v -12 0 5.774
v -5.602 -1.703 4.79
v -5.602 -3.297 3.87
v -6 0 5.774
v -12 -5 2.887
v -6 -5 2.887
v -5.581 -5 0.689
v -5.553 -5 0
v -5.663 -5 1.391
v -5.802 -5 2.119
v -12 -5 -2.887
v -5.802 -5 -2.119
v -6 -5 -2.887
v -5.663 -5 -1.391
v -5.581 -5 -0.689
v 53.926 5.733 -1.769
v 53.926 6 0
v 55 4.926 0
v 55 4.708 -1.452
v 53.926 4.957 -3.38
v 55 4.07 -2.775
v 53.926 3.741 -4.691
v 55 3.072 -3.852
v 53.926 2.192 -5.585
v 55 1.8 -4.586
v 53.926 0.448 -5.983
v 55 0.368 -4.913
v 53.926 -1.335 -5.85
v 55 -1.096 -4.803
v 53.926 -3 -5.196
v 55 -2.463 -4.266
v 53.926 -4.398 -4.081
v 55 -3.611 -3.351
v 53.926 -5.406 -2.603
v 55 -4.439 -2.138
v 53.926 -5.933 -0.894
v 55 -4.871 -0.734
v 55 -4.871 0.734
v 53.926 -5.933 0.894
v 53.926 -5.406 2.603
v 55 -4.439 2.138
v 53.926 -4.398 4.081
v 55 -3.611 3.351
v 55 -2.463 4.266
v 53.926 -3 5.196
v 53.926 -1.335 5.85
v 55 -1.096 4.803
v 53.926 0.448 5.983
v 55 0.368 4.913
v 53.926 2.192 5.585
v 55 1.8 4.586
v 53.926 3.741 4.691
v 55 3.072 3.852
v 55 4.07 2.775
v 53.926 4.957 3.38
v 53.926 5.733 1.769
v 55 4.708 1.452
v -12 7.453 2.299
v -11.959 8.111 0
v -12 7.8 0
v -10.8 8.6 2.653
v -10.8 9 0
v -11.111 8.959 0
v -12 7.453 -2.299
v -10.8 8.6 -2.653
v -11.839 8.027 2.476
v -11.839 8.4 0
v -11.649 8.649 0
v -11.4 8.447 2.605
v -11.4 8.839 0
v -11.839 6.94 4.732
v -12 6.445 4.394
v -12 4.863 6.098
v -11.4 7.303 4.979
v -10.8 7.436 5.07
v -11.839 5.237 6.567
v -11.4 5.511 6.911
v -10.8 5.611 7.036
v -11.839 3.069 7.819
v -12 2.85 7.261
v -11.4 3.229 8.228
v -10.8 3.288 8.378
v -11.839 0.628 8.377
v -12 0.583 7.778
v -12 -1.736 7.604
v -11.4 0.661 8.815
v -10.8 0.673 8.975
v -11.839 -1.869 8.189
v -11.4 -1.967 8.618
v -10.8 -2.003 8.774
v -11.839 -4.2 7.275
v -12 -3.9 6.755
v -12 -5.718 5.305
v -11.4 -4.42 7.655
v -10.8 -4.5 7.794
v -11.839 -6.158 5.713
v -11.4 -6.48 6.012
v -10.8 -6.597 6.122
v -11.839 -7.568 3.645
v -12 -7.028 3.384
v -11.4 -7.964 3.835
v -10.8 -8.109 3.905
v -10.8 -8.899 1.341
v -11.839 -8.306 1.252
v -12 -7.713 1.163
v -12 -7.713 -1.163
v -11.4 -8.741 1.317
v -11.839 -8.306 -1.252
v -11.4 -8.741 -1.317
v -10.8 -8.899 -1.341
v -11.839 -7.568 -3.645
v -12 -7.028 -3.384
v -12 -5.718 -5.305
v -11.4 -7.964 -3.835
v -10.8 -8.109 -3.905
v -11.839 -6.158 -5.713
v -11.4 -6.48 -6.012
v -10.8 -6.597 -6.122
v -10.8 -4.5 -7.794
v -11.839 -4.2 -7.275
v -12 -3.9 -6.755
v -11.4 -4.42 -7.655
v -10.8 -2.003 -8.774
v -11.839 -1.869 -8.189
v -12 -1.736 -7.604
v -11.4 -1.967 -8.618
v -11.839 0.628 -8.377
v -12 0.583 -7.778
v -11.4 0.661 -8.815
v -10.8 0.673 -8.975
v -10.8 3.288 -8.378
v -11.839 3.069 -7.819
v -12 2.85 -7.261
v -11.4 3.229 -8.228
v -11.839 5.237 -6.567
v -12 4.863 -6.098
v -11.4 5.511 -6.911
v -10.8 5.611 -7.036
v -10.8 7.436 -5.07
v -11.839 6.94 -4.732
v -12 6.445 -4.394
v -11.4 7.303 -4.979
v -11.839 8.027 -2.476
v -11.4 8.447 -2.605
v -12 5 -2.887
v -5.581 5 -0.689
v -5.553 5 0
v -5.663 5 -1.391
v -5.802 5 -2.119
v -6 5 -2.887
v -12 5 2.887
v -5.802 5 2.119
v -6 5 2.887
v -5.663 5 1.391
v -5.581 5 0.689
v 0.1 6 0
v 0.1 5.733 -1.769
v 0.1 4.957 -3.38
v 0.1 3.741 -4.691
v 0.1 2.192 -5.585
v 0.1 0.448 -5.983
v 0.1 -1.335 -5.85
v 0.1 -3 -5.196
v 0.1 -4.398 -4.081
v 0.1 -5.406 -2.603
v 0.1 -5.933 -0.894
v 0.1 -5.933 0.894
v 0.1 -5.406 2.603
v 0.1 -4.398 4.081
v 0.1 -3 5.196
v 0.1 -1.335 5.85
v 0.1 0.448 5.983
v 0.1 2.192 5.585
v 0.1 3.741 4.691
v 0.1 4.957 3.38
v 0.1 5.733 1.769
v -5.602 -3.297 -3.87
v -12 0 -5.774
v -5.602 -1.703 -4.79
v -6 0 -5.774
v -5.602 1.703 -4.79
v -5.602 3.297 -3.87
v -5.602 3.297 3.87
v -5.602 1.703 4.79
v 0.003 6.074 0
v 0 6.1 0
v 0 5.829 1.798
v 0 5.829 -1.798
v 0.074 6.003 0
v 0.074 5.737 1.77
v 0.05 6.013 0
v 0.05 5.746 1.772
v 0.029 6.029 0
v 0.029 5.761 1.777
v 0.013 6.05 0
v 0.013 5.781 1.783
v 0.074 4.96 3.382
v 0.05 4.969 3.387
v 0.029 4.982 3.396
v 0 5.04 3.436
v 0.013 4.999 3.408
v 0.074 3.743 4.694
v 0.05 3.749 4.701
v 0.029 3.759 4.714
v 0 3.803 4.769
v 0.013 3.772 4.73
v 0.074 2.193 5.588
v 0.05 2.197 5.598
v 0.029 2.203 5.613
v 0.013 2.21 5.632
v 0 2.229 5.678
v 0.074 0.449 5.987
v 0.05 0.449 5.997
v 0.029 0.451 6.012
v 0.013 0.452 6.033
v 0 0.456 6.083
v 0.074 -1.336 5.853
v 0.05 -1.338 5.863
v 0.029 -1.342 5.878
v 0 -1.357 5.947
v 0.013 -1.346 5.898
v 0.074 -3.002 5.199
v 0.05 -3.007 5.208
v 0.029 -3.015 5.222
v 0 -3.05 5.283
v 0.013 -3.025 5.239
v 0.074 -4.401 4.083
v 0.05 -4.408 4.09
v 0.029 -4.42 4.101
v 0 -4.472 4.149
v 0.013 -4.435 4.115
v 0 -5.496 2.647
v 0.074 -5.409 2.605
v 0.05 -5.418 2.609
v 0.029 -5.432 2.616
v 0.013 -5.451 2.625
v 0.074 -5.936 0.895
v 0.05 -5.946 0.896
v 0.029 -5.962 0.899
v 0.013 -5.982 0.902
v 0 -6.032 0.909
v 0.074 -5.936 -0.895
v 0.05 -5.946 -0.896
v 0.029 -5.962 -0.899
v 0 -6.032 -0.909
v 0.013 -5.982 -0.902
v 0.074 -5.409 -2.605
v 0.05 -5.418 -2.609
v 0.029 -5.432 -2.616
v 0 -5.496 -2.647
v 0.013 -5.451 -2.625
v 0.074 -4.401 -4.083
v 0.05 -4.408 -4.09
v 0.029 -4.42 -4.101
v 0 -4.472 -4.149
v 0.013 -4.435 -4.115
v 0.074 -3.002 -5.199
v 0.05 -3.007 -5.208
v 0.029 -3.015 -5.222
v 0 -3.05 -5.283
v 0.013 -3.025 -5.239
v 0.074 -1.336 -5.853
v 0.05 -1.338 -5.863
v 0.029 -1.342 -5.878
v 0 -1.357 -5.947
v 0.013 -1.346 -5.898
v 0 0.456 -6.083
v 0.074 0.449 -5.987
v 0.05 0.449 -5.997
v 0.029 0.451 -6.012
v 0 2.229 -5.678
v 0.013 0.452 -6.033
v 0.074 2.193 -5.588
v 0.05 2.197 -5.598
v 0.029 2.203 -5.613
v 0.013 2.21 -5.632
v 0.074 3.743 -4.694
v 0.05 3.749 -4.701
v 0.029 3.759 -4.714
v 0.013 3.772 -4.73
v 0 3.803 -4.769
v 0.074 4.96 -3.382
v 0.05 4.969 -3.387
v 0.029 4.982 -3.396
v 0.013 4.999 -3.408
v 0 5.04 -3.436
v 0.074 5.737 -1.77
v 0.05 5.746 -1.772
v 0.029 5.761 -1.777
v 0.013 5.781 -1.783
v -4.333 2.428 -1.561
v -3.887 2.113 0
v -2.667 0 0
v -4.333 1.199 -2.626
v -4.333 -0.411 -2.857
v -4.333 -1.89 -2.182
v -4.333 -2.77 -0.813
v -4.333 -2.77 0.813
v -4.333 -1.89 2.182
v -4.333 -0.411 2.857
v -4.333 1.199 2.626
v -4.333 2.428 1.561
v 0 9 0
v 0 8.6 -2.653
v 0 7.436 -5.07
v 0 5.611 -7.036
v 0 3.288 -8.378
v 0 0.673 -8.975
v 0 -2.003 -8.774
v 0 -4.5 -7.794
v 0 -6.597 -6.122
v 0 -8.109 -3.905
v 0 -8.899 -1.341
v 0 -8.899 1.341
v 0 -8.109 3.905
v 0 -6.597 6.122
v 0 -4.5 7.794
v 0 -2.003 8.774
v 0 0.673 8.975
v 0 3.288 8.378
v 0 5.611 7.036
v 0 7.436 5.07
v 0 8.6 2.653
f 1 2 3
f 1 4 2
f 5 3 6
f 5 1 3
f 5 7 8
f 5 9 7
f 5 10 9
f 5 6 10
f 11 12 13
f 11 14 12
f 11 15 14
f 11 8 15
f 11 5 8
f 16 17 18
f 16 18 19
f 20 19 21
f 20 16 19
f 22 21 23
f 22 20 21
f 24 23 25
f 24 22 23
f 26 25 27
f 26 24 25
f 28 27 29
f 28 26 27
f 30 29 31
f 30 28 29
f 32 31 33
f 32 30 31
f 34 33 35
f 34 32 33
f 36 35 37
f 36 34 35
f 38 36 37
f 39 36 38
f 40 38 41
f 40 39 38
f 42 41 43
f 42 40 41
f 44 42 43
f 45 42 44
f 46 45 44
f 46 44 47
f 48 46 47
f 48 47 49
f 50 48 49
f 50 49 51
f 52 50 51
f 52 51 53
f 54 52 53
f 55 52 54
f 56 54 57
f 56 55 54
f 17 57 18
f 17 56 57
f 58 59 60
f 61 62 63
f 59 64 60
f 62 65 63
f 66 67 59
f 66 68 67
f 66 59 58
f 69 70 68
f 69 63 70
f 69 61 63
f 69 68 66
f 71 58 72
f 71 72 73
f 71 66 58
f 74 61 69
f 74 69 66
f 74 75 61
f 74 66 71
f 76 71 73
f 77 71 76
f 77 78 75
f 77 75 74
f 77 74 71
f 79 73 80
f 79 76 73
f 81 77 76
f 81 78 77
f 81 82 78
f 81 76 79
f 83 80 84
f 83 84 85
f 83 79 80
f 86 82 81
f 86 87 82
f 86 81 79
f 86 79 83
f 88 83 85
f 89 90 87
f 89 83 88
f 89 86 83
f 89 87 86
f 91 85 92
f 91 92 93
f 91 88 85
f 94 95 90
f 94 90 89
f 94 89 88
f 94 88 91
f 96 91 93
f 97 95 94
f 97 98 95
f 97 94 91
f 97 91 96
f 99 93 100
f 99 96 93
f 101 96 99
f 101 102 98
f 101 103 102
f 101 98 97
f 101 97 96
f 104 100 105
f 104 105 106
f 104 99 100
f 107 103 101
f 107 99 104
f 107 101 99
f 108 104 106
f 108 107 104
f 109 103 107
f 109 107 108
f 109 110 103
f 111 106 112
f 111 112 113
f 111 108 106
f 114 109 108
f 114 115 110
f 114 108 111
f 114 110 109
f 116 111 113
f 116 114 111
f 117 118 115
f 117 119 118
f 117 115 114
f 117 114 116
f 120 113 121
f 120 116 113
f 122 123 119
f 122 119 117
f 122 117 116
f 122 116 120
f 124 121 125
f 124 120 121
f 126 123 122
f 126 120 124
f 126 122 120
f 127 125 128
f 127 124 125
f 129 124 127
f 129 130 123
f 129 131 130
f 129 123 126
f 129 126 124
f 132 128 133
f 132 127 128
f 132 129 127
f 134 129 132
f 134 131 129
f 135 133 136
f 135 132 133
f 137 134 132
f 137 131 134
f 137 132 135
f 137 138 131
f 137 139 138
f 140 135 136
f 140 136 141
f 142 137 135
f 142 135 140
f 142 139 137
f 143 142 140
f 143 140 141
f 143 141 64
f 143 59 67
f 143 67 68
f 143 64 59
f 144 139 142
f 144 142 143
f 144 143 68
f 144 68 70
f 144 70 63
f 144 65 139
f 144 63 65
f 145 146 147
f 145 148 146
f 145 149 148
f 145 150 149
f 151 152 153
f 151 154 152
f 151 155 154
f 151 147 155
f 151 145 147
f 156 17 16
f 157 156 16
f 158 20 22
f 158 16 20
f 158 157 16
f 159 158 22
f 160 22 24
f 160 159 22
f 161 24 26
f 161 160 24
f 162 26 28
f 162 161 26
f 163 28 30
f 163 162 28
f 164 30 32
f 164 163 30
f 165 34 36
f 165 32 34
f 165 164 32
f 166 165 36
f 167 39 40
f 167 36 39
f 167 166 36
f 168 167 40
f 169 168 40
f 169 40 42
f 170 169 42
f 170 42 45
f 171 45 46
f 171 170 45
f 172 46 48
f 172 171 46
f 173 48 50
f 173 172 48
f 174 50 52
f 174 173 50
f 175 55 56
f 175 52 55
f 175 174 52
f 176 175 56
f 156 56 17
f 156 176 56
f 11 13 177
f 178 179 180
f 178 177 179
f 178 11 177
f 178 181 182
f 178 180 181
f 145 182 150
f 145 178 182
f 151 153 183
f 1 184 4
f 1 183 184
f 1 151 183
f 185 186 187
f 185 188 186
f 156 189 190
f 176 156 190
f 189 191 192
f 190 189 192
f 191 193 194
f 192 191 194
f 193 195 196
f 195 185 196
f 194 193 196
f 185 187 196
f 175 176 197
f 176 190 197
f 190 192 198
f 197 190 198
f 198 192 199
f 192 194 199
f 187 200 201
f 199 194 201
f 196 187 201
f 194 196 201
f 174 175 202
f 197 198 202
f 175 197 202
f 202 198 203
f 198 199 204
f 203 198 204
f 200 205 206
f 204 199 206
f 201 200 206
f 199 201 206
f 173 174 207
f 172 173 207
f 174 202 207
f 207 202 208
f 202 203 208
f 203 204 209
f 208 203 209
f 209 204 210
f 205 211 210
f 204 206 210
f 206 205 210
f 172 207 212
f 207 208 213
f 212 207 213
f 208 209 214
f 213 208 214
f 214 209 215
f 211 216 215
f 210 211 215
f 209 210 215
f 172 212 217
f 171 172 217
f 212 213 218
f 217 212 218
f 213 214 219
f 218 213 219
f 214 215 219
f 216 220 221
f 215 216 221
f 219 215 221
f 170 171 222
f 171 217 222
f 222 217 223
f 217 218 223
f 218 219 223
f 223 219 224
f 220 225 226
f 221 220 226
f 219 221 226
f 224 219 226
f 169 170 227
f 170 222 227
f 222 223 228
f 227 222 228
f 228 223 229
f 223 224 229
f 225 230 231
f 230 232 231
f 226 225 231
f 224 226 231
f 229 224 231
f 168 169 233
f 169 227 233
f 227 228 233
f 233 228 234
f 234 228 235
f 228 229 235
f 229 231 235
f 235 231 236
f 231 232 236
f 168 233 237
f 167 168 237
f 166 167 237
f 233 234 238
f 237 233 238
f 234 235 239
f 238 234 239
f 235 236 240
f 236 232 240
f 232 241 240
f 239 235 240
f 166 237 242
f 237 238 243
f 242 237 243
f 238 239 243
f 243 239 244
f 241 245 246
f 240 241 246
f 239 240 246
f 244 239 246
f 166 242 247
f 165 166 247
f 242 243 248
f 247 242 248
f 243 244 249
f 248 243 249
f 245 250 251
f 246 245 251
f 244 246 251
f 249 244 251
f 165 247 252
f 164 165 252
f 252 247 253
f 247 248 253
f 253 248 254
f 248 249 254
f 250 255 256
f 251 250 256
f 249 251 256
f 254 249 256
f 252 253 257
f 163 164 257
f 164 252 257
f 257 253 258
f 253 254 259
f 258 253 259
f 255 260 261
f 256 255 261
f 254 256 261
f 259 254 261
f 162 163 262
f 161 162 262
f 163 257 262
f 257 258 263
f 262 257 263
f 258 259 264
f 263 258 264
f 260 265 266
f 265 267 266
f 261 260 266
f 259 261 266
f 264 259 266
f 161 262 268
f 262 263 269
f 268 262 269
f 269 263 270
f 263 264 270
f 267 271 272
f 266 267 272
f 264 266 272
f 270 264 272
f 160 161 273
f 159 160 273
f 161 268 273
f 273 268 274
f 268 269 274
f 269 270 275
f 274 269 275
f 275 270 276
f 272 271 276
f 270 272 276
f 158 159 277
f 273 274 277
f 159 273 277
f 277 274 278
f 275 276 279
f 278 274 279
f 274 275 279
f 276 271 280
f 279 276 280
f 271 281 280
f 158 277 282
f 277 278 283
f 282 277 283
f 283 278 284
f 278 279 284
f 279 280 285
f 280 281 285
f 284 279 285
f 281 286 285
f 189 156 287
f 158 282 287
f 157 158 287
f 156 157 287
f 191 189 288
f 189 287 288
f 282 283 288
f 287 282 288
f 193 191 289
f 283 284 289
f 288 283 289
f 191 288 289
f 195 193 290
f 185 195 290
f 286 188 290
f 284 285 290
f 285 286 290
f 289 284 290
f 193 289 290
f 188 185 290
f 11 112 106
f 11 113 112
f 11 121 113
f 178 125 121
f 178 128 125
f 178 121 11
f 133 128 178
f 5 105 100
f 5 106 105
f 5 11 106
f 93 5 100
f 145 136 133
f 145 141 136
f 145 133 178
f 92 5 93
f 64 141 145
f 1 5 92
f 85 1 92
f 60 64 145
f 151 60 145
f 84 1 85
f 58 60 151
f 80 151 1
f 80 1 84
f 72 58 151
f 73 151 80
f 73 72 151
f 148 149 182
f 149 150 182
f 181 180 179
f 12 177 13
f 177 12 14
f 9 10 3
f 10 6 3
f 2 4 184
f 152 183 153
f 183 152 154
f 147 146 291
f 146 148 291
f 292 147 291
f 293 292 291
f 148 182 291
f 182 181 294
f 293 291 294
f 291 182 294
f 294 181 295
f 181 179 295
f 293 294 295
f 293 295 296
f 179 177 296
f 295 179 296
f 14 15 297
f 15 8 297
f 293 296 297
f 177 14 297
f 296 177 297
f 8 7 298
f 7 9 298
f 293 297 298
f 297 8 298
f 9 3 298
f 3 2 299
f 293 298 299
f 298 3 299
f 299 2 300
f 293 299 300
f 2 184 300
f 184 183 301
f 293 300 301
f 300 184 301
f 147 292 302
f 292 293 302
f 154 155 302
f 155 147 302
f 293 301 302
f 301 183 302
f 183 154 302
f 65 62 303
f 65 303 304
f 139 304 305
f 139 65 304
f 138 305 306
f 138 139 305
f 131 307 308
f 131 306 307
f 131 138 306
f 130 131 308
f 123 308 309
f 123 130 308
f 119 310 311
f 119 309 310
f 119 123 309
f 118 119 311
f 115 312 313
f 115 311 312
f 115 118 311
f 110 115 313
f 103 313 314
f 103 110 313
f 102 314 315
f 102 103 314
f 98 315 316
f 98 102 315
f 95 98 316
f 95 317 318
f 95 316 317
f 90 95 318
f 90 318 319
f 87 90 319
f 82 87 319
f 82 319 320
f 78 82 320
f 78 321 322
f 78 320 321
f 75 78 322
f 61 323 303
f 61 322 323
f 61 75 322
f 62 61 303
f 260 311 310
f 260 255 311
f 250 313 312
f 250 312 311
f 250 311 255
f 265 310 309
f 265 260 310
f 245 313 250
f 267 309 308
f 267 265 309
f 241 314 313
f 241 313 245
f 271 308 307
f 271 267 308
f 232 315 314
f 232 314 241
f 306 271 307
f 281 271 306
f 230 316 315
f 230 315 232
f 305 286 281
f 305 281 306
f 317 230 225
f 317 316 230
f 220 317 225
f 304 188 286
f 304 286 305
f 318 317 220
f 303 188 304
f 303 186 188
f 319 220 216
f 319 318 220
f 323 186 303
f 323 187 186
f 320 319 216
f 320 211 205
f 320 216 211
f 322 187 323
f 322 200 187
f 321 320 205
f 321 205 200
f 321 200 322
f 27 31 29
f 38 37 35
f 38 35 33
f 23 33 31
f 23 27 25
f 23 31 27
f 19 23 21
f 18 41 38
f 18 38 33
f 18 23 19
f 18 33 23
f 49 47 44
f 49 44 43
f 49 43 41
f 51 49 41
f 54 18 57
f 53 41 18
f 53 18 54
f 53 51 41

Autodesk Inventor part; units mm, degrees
ref_plane "YZ Plane" through (0, 0, 0) normal (1, 0, 0) x (0, 1, 0)
ref_plane "XZ Plane" through (0, 0, 0) normal (0, 1, 0) x (-1, 0, 0)
sketch "Skizze1" plane through (0, 0, 0) normal (0, 0, 1) x (1, 0, 0)
  line L0 (-2.6667, 0) -> (55, 0)
  line L1 (55, 0) -> (55, 6)
  line L2 (55, 6) -> (19, 6)
  line L3 (19, 6) -> (17.9264, 6)
  line L4 (17.9264, 6) -> (0, 6)
  line L5 (0, 6) -> (0, 9)
  line L6 (0, 9) -> (-12, 9)
  line L7 (-12, 9) -> (-12, 5.7735)
  line L8 (-12, 5.7735) -> (-6, 5.7735)
  line L9 (-6, 5.7735) -> (-2.6667, 0)
  line L10 (-25.4, 0) -> (68.4, 0) projected
  line L11 (0, -1.8) -> (0, 10.8) projected
  line L12 (19, 6) -> (0, 6) construction
  dimension "d1" = 36
  dimension "d2" = 1.0736
  dimension "d3" = 12
  dimension "d4" = 6
  dimension "d5" = 60
  dimension "d6" = 12
  dimension "d7" = 12
  dimension "d8" = 11.547
  dimension "d9" = 18
  dimension "d26" = 55
revolve "Körper" add sketch "Skizze1" angle 360 about axis through (-2.6667, 0, 0) along (1, 0, 0)
sketch "Skizze2" plane through (-12, 0, 0) normal (-1, 0, 0) x (0, 0, 1)
  circle A0 centre (0, 0) radius 5.7735 projected
  line L0 (0, -12.6) -> (0, 12.6) projected
  line L1 (-12.6, 0) -> (12.6, 0) projected
  line L2 (5.7735, 0) -> (2.8868, -5)
  line L3 (2.8868, -5) -> (-2.8868, -5)
  line L4 (-2.8868, -5) -> (-5.7735, 0)
  line L5 (-5.7735, 0) -> (-2.8868, 5)
  line L6 (-2.8868, 5) -> (2.8868, 5)
  line L7 (2.8868, 5) -> (5.7735, 0)
extrude "Loch" add sketch "Skizze2" against normal up to next contours L7 A0 | A0 L2 | L6 L0 A0 | A0 L0 L3 | L0 L6 A0 | A0 L3 L0 | L4 A0 | A0 L5
fillet "Rundung1" radius 1.2 1 edges at (-12, -9, 0)
thread "Gewinde" size "M12x1.75" class "6g" standard "ISO Metric profile" length 36
chamfer "Fase1" distance 1.0735 distance2 1.0735 1 edges at (55, -6, 0) measured on face at (55, 1.497, 1.3262)
ref_plane "Work Plane1" through (29, 0, 0) normal (0, -1, 0) x (1, 0, 0)
fillet "Fillet2" radius 0.1 1 edges at (0, -6, 0)
equation "\"d1\" = GEL"
equation "\"d3\" = KOH"
equation "\"d4\" = INTI"
equation "\"d6\" = GD"
equation "\"d7\" = BDM"
equation "\"d8\" = 1.1547 * SW"
equation "\"d9\" = KOD"
equation "\"d26\" = NLG"
equation "\"d30\" = R"
equation "\"d17\" = RR"
equation "\"d13\" = GEL"
equation "\"d15\" = -0.5 * SPD + 0.5 * GD"
equation "\"d16\" = GUL"
equation "\"GD\" = 12"
equation "\"NLG\" = 55"
equation "\"GEL\" = 36"
equation "\"KOD\" = 18"
equation "\"KOH\" = 12"
equation "\"INTI\" = 6"
equation "\"GAL\" = 0.61345 * PTC"
equation "\"GUL\" = 0.61345 * PTC"
equation "\"BDM\" = NND"
equation "\"RR\" = 1.2"
equation "\"SPD\" = NND - 1.2269 * PTC"
equation "\"R\" = 0.1"
equation "\"TOA\" = 30deg"
equation "\"GD1\" = THREADDIA - 1.2269 * PTC"
equation "\"THREADDIA\" = 12"
equation "\"FAWI\" = 45deg"
equation "\"PTC\" = 1.75"
equation "\"NND\" = 12"
equation "\"E0\" = 1.155 * SW"
equation "\"SW\" = 10"
properties part number "ISO 4762 - M12 x 55" material "Edelstahl, 440C"
